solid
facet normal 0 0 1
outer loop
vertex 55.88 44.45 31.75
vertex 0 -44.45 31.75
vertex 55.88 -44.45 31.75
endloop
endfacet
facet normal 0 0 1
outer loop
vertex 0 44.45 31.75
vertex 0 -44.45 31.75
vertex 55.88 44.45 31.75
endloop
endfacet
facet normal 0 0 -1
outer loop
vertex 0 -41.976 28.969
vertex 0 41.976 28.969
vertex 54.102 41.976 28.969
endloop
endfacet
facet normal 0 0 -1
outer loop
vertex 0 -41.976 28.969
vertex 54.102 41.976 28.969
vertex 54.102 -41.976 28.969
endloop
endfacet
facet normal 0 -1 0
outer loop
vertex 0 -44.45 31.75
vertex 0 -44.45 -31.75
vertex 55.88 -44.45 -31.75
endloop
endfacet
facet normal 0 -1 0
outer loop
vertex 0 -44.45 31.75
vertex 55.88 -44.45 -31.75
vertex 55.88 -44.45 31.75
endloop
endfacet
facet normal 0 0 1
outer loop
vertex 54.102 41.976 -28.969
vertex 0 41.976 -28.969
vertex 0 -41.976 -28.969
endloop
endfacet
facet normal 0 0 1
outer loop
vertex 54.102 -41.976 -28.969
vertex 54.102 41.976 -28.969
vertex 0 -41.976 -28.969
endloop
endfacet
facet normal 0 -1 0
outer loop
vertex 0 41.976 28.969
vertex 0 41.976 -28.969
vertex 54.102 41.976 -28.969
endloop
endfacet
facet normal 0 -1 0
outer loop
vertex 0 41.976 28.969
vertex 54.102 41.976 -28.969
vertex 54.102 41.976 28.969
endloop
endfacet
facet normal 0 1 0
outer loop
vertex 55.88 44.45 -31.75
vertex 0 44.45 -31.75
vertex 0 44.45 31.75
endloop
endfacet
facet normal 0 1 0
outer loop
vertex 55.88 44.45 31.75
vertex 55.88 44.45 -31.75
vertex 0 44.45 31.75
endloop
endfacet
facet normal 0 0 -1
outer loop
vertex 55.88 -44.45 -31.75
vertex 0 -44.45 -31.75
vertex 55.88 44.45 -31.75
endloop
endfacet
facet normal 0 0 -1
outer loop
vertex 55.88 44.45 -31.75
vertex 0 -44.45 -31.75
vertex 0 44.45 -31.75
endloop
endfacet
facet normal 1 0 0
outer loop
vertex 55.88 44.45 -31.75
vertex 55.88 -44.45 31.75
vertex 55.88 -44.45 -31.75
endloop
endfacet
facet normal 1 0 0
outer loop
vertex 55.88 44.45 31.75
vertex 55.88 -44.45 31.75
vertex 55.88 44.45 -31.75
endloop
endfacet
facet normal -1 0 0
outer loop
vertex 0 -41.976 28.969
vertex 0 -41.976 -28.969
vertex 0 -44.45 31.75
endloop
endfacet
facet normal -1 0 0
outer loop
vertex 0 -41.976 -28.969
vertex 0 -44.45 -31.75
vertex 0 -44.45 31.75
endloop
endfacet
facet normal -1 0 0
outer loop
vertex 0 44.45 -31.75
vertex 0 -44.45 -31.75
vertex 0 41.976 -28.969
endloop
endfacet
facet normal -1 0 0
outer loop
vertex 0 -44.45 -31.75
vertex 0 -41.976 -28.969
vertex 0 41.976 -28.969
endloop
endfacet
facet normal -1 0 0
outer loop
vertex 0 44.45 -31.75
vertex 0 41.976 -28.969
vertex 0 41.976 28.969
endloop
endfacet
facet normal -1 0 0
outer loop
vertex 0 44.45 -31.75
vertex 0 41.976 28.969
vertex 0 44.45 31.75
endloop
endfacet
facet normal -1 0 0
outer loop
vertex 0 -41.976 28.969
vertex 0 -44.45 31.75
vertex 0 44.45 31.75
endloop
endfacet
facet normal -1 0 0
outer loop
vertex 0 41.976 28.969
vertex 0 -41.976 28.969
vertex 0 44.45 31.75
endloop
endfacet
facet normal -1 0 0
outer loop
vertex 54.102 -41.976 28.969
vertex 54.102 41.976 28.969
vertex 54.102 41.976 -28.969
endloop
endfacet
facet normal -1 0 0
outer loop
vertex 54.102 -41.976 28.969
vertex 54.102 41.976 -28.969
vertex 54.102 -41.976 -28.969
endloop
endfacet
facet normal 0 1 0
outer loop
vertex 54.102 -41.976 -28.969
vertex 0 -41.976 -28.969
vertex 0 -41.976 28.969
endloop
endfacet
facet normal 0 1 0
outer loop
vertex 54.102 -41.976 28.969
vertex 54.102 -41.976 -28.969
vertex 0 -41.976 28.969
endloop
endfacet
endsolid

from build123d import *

# Parameters (mm, degrees)
F0_W     = 88.9
F0_H     = 63.5
F1_DEPTH = 55.88
F2_W     = 83.951384
F2_H     = 57.938274
F3_DEPTH = 54.102


with BuildPart() as f1:
    # F0 (on Right) → F1 (new body)
    with BuildSketch(Plane.YZ):
        Rectangle(F0_W, F0_H)
    extrude(amount=F1_DEPTH)

    # F2 (on face) → F3 (cut)
    with BuildSketch(Plane(origin=(0, 0, 0), x_dir=(0, -1, 0), z_dir=(-1, 0, 0))):
        Rectangle(F2_W, F2_H)
    extrude(amount=-F3_DEPTH, mode=Mode.SUBTRACT)


solid = f1.part
